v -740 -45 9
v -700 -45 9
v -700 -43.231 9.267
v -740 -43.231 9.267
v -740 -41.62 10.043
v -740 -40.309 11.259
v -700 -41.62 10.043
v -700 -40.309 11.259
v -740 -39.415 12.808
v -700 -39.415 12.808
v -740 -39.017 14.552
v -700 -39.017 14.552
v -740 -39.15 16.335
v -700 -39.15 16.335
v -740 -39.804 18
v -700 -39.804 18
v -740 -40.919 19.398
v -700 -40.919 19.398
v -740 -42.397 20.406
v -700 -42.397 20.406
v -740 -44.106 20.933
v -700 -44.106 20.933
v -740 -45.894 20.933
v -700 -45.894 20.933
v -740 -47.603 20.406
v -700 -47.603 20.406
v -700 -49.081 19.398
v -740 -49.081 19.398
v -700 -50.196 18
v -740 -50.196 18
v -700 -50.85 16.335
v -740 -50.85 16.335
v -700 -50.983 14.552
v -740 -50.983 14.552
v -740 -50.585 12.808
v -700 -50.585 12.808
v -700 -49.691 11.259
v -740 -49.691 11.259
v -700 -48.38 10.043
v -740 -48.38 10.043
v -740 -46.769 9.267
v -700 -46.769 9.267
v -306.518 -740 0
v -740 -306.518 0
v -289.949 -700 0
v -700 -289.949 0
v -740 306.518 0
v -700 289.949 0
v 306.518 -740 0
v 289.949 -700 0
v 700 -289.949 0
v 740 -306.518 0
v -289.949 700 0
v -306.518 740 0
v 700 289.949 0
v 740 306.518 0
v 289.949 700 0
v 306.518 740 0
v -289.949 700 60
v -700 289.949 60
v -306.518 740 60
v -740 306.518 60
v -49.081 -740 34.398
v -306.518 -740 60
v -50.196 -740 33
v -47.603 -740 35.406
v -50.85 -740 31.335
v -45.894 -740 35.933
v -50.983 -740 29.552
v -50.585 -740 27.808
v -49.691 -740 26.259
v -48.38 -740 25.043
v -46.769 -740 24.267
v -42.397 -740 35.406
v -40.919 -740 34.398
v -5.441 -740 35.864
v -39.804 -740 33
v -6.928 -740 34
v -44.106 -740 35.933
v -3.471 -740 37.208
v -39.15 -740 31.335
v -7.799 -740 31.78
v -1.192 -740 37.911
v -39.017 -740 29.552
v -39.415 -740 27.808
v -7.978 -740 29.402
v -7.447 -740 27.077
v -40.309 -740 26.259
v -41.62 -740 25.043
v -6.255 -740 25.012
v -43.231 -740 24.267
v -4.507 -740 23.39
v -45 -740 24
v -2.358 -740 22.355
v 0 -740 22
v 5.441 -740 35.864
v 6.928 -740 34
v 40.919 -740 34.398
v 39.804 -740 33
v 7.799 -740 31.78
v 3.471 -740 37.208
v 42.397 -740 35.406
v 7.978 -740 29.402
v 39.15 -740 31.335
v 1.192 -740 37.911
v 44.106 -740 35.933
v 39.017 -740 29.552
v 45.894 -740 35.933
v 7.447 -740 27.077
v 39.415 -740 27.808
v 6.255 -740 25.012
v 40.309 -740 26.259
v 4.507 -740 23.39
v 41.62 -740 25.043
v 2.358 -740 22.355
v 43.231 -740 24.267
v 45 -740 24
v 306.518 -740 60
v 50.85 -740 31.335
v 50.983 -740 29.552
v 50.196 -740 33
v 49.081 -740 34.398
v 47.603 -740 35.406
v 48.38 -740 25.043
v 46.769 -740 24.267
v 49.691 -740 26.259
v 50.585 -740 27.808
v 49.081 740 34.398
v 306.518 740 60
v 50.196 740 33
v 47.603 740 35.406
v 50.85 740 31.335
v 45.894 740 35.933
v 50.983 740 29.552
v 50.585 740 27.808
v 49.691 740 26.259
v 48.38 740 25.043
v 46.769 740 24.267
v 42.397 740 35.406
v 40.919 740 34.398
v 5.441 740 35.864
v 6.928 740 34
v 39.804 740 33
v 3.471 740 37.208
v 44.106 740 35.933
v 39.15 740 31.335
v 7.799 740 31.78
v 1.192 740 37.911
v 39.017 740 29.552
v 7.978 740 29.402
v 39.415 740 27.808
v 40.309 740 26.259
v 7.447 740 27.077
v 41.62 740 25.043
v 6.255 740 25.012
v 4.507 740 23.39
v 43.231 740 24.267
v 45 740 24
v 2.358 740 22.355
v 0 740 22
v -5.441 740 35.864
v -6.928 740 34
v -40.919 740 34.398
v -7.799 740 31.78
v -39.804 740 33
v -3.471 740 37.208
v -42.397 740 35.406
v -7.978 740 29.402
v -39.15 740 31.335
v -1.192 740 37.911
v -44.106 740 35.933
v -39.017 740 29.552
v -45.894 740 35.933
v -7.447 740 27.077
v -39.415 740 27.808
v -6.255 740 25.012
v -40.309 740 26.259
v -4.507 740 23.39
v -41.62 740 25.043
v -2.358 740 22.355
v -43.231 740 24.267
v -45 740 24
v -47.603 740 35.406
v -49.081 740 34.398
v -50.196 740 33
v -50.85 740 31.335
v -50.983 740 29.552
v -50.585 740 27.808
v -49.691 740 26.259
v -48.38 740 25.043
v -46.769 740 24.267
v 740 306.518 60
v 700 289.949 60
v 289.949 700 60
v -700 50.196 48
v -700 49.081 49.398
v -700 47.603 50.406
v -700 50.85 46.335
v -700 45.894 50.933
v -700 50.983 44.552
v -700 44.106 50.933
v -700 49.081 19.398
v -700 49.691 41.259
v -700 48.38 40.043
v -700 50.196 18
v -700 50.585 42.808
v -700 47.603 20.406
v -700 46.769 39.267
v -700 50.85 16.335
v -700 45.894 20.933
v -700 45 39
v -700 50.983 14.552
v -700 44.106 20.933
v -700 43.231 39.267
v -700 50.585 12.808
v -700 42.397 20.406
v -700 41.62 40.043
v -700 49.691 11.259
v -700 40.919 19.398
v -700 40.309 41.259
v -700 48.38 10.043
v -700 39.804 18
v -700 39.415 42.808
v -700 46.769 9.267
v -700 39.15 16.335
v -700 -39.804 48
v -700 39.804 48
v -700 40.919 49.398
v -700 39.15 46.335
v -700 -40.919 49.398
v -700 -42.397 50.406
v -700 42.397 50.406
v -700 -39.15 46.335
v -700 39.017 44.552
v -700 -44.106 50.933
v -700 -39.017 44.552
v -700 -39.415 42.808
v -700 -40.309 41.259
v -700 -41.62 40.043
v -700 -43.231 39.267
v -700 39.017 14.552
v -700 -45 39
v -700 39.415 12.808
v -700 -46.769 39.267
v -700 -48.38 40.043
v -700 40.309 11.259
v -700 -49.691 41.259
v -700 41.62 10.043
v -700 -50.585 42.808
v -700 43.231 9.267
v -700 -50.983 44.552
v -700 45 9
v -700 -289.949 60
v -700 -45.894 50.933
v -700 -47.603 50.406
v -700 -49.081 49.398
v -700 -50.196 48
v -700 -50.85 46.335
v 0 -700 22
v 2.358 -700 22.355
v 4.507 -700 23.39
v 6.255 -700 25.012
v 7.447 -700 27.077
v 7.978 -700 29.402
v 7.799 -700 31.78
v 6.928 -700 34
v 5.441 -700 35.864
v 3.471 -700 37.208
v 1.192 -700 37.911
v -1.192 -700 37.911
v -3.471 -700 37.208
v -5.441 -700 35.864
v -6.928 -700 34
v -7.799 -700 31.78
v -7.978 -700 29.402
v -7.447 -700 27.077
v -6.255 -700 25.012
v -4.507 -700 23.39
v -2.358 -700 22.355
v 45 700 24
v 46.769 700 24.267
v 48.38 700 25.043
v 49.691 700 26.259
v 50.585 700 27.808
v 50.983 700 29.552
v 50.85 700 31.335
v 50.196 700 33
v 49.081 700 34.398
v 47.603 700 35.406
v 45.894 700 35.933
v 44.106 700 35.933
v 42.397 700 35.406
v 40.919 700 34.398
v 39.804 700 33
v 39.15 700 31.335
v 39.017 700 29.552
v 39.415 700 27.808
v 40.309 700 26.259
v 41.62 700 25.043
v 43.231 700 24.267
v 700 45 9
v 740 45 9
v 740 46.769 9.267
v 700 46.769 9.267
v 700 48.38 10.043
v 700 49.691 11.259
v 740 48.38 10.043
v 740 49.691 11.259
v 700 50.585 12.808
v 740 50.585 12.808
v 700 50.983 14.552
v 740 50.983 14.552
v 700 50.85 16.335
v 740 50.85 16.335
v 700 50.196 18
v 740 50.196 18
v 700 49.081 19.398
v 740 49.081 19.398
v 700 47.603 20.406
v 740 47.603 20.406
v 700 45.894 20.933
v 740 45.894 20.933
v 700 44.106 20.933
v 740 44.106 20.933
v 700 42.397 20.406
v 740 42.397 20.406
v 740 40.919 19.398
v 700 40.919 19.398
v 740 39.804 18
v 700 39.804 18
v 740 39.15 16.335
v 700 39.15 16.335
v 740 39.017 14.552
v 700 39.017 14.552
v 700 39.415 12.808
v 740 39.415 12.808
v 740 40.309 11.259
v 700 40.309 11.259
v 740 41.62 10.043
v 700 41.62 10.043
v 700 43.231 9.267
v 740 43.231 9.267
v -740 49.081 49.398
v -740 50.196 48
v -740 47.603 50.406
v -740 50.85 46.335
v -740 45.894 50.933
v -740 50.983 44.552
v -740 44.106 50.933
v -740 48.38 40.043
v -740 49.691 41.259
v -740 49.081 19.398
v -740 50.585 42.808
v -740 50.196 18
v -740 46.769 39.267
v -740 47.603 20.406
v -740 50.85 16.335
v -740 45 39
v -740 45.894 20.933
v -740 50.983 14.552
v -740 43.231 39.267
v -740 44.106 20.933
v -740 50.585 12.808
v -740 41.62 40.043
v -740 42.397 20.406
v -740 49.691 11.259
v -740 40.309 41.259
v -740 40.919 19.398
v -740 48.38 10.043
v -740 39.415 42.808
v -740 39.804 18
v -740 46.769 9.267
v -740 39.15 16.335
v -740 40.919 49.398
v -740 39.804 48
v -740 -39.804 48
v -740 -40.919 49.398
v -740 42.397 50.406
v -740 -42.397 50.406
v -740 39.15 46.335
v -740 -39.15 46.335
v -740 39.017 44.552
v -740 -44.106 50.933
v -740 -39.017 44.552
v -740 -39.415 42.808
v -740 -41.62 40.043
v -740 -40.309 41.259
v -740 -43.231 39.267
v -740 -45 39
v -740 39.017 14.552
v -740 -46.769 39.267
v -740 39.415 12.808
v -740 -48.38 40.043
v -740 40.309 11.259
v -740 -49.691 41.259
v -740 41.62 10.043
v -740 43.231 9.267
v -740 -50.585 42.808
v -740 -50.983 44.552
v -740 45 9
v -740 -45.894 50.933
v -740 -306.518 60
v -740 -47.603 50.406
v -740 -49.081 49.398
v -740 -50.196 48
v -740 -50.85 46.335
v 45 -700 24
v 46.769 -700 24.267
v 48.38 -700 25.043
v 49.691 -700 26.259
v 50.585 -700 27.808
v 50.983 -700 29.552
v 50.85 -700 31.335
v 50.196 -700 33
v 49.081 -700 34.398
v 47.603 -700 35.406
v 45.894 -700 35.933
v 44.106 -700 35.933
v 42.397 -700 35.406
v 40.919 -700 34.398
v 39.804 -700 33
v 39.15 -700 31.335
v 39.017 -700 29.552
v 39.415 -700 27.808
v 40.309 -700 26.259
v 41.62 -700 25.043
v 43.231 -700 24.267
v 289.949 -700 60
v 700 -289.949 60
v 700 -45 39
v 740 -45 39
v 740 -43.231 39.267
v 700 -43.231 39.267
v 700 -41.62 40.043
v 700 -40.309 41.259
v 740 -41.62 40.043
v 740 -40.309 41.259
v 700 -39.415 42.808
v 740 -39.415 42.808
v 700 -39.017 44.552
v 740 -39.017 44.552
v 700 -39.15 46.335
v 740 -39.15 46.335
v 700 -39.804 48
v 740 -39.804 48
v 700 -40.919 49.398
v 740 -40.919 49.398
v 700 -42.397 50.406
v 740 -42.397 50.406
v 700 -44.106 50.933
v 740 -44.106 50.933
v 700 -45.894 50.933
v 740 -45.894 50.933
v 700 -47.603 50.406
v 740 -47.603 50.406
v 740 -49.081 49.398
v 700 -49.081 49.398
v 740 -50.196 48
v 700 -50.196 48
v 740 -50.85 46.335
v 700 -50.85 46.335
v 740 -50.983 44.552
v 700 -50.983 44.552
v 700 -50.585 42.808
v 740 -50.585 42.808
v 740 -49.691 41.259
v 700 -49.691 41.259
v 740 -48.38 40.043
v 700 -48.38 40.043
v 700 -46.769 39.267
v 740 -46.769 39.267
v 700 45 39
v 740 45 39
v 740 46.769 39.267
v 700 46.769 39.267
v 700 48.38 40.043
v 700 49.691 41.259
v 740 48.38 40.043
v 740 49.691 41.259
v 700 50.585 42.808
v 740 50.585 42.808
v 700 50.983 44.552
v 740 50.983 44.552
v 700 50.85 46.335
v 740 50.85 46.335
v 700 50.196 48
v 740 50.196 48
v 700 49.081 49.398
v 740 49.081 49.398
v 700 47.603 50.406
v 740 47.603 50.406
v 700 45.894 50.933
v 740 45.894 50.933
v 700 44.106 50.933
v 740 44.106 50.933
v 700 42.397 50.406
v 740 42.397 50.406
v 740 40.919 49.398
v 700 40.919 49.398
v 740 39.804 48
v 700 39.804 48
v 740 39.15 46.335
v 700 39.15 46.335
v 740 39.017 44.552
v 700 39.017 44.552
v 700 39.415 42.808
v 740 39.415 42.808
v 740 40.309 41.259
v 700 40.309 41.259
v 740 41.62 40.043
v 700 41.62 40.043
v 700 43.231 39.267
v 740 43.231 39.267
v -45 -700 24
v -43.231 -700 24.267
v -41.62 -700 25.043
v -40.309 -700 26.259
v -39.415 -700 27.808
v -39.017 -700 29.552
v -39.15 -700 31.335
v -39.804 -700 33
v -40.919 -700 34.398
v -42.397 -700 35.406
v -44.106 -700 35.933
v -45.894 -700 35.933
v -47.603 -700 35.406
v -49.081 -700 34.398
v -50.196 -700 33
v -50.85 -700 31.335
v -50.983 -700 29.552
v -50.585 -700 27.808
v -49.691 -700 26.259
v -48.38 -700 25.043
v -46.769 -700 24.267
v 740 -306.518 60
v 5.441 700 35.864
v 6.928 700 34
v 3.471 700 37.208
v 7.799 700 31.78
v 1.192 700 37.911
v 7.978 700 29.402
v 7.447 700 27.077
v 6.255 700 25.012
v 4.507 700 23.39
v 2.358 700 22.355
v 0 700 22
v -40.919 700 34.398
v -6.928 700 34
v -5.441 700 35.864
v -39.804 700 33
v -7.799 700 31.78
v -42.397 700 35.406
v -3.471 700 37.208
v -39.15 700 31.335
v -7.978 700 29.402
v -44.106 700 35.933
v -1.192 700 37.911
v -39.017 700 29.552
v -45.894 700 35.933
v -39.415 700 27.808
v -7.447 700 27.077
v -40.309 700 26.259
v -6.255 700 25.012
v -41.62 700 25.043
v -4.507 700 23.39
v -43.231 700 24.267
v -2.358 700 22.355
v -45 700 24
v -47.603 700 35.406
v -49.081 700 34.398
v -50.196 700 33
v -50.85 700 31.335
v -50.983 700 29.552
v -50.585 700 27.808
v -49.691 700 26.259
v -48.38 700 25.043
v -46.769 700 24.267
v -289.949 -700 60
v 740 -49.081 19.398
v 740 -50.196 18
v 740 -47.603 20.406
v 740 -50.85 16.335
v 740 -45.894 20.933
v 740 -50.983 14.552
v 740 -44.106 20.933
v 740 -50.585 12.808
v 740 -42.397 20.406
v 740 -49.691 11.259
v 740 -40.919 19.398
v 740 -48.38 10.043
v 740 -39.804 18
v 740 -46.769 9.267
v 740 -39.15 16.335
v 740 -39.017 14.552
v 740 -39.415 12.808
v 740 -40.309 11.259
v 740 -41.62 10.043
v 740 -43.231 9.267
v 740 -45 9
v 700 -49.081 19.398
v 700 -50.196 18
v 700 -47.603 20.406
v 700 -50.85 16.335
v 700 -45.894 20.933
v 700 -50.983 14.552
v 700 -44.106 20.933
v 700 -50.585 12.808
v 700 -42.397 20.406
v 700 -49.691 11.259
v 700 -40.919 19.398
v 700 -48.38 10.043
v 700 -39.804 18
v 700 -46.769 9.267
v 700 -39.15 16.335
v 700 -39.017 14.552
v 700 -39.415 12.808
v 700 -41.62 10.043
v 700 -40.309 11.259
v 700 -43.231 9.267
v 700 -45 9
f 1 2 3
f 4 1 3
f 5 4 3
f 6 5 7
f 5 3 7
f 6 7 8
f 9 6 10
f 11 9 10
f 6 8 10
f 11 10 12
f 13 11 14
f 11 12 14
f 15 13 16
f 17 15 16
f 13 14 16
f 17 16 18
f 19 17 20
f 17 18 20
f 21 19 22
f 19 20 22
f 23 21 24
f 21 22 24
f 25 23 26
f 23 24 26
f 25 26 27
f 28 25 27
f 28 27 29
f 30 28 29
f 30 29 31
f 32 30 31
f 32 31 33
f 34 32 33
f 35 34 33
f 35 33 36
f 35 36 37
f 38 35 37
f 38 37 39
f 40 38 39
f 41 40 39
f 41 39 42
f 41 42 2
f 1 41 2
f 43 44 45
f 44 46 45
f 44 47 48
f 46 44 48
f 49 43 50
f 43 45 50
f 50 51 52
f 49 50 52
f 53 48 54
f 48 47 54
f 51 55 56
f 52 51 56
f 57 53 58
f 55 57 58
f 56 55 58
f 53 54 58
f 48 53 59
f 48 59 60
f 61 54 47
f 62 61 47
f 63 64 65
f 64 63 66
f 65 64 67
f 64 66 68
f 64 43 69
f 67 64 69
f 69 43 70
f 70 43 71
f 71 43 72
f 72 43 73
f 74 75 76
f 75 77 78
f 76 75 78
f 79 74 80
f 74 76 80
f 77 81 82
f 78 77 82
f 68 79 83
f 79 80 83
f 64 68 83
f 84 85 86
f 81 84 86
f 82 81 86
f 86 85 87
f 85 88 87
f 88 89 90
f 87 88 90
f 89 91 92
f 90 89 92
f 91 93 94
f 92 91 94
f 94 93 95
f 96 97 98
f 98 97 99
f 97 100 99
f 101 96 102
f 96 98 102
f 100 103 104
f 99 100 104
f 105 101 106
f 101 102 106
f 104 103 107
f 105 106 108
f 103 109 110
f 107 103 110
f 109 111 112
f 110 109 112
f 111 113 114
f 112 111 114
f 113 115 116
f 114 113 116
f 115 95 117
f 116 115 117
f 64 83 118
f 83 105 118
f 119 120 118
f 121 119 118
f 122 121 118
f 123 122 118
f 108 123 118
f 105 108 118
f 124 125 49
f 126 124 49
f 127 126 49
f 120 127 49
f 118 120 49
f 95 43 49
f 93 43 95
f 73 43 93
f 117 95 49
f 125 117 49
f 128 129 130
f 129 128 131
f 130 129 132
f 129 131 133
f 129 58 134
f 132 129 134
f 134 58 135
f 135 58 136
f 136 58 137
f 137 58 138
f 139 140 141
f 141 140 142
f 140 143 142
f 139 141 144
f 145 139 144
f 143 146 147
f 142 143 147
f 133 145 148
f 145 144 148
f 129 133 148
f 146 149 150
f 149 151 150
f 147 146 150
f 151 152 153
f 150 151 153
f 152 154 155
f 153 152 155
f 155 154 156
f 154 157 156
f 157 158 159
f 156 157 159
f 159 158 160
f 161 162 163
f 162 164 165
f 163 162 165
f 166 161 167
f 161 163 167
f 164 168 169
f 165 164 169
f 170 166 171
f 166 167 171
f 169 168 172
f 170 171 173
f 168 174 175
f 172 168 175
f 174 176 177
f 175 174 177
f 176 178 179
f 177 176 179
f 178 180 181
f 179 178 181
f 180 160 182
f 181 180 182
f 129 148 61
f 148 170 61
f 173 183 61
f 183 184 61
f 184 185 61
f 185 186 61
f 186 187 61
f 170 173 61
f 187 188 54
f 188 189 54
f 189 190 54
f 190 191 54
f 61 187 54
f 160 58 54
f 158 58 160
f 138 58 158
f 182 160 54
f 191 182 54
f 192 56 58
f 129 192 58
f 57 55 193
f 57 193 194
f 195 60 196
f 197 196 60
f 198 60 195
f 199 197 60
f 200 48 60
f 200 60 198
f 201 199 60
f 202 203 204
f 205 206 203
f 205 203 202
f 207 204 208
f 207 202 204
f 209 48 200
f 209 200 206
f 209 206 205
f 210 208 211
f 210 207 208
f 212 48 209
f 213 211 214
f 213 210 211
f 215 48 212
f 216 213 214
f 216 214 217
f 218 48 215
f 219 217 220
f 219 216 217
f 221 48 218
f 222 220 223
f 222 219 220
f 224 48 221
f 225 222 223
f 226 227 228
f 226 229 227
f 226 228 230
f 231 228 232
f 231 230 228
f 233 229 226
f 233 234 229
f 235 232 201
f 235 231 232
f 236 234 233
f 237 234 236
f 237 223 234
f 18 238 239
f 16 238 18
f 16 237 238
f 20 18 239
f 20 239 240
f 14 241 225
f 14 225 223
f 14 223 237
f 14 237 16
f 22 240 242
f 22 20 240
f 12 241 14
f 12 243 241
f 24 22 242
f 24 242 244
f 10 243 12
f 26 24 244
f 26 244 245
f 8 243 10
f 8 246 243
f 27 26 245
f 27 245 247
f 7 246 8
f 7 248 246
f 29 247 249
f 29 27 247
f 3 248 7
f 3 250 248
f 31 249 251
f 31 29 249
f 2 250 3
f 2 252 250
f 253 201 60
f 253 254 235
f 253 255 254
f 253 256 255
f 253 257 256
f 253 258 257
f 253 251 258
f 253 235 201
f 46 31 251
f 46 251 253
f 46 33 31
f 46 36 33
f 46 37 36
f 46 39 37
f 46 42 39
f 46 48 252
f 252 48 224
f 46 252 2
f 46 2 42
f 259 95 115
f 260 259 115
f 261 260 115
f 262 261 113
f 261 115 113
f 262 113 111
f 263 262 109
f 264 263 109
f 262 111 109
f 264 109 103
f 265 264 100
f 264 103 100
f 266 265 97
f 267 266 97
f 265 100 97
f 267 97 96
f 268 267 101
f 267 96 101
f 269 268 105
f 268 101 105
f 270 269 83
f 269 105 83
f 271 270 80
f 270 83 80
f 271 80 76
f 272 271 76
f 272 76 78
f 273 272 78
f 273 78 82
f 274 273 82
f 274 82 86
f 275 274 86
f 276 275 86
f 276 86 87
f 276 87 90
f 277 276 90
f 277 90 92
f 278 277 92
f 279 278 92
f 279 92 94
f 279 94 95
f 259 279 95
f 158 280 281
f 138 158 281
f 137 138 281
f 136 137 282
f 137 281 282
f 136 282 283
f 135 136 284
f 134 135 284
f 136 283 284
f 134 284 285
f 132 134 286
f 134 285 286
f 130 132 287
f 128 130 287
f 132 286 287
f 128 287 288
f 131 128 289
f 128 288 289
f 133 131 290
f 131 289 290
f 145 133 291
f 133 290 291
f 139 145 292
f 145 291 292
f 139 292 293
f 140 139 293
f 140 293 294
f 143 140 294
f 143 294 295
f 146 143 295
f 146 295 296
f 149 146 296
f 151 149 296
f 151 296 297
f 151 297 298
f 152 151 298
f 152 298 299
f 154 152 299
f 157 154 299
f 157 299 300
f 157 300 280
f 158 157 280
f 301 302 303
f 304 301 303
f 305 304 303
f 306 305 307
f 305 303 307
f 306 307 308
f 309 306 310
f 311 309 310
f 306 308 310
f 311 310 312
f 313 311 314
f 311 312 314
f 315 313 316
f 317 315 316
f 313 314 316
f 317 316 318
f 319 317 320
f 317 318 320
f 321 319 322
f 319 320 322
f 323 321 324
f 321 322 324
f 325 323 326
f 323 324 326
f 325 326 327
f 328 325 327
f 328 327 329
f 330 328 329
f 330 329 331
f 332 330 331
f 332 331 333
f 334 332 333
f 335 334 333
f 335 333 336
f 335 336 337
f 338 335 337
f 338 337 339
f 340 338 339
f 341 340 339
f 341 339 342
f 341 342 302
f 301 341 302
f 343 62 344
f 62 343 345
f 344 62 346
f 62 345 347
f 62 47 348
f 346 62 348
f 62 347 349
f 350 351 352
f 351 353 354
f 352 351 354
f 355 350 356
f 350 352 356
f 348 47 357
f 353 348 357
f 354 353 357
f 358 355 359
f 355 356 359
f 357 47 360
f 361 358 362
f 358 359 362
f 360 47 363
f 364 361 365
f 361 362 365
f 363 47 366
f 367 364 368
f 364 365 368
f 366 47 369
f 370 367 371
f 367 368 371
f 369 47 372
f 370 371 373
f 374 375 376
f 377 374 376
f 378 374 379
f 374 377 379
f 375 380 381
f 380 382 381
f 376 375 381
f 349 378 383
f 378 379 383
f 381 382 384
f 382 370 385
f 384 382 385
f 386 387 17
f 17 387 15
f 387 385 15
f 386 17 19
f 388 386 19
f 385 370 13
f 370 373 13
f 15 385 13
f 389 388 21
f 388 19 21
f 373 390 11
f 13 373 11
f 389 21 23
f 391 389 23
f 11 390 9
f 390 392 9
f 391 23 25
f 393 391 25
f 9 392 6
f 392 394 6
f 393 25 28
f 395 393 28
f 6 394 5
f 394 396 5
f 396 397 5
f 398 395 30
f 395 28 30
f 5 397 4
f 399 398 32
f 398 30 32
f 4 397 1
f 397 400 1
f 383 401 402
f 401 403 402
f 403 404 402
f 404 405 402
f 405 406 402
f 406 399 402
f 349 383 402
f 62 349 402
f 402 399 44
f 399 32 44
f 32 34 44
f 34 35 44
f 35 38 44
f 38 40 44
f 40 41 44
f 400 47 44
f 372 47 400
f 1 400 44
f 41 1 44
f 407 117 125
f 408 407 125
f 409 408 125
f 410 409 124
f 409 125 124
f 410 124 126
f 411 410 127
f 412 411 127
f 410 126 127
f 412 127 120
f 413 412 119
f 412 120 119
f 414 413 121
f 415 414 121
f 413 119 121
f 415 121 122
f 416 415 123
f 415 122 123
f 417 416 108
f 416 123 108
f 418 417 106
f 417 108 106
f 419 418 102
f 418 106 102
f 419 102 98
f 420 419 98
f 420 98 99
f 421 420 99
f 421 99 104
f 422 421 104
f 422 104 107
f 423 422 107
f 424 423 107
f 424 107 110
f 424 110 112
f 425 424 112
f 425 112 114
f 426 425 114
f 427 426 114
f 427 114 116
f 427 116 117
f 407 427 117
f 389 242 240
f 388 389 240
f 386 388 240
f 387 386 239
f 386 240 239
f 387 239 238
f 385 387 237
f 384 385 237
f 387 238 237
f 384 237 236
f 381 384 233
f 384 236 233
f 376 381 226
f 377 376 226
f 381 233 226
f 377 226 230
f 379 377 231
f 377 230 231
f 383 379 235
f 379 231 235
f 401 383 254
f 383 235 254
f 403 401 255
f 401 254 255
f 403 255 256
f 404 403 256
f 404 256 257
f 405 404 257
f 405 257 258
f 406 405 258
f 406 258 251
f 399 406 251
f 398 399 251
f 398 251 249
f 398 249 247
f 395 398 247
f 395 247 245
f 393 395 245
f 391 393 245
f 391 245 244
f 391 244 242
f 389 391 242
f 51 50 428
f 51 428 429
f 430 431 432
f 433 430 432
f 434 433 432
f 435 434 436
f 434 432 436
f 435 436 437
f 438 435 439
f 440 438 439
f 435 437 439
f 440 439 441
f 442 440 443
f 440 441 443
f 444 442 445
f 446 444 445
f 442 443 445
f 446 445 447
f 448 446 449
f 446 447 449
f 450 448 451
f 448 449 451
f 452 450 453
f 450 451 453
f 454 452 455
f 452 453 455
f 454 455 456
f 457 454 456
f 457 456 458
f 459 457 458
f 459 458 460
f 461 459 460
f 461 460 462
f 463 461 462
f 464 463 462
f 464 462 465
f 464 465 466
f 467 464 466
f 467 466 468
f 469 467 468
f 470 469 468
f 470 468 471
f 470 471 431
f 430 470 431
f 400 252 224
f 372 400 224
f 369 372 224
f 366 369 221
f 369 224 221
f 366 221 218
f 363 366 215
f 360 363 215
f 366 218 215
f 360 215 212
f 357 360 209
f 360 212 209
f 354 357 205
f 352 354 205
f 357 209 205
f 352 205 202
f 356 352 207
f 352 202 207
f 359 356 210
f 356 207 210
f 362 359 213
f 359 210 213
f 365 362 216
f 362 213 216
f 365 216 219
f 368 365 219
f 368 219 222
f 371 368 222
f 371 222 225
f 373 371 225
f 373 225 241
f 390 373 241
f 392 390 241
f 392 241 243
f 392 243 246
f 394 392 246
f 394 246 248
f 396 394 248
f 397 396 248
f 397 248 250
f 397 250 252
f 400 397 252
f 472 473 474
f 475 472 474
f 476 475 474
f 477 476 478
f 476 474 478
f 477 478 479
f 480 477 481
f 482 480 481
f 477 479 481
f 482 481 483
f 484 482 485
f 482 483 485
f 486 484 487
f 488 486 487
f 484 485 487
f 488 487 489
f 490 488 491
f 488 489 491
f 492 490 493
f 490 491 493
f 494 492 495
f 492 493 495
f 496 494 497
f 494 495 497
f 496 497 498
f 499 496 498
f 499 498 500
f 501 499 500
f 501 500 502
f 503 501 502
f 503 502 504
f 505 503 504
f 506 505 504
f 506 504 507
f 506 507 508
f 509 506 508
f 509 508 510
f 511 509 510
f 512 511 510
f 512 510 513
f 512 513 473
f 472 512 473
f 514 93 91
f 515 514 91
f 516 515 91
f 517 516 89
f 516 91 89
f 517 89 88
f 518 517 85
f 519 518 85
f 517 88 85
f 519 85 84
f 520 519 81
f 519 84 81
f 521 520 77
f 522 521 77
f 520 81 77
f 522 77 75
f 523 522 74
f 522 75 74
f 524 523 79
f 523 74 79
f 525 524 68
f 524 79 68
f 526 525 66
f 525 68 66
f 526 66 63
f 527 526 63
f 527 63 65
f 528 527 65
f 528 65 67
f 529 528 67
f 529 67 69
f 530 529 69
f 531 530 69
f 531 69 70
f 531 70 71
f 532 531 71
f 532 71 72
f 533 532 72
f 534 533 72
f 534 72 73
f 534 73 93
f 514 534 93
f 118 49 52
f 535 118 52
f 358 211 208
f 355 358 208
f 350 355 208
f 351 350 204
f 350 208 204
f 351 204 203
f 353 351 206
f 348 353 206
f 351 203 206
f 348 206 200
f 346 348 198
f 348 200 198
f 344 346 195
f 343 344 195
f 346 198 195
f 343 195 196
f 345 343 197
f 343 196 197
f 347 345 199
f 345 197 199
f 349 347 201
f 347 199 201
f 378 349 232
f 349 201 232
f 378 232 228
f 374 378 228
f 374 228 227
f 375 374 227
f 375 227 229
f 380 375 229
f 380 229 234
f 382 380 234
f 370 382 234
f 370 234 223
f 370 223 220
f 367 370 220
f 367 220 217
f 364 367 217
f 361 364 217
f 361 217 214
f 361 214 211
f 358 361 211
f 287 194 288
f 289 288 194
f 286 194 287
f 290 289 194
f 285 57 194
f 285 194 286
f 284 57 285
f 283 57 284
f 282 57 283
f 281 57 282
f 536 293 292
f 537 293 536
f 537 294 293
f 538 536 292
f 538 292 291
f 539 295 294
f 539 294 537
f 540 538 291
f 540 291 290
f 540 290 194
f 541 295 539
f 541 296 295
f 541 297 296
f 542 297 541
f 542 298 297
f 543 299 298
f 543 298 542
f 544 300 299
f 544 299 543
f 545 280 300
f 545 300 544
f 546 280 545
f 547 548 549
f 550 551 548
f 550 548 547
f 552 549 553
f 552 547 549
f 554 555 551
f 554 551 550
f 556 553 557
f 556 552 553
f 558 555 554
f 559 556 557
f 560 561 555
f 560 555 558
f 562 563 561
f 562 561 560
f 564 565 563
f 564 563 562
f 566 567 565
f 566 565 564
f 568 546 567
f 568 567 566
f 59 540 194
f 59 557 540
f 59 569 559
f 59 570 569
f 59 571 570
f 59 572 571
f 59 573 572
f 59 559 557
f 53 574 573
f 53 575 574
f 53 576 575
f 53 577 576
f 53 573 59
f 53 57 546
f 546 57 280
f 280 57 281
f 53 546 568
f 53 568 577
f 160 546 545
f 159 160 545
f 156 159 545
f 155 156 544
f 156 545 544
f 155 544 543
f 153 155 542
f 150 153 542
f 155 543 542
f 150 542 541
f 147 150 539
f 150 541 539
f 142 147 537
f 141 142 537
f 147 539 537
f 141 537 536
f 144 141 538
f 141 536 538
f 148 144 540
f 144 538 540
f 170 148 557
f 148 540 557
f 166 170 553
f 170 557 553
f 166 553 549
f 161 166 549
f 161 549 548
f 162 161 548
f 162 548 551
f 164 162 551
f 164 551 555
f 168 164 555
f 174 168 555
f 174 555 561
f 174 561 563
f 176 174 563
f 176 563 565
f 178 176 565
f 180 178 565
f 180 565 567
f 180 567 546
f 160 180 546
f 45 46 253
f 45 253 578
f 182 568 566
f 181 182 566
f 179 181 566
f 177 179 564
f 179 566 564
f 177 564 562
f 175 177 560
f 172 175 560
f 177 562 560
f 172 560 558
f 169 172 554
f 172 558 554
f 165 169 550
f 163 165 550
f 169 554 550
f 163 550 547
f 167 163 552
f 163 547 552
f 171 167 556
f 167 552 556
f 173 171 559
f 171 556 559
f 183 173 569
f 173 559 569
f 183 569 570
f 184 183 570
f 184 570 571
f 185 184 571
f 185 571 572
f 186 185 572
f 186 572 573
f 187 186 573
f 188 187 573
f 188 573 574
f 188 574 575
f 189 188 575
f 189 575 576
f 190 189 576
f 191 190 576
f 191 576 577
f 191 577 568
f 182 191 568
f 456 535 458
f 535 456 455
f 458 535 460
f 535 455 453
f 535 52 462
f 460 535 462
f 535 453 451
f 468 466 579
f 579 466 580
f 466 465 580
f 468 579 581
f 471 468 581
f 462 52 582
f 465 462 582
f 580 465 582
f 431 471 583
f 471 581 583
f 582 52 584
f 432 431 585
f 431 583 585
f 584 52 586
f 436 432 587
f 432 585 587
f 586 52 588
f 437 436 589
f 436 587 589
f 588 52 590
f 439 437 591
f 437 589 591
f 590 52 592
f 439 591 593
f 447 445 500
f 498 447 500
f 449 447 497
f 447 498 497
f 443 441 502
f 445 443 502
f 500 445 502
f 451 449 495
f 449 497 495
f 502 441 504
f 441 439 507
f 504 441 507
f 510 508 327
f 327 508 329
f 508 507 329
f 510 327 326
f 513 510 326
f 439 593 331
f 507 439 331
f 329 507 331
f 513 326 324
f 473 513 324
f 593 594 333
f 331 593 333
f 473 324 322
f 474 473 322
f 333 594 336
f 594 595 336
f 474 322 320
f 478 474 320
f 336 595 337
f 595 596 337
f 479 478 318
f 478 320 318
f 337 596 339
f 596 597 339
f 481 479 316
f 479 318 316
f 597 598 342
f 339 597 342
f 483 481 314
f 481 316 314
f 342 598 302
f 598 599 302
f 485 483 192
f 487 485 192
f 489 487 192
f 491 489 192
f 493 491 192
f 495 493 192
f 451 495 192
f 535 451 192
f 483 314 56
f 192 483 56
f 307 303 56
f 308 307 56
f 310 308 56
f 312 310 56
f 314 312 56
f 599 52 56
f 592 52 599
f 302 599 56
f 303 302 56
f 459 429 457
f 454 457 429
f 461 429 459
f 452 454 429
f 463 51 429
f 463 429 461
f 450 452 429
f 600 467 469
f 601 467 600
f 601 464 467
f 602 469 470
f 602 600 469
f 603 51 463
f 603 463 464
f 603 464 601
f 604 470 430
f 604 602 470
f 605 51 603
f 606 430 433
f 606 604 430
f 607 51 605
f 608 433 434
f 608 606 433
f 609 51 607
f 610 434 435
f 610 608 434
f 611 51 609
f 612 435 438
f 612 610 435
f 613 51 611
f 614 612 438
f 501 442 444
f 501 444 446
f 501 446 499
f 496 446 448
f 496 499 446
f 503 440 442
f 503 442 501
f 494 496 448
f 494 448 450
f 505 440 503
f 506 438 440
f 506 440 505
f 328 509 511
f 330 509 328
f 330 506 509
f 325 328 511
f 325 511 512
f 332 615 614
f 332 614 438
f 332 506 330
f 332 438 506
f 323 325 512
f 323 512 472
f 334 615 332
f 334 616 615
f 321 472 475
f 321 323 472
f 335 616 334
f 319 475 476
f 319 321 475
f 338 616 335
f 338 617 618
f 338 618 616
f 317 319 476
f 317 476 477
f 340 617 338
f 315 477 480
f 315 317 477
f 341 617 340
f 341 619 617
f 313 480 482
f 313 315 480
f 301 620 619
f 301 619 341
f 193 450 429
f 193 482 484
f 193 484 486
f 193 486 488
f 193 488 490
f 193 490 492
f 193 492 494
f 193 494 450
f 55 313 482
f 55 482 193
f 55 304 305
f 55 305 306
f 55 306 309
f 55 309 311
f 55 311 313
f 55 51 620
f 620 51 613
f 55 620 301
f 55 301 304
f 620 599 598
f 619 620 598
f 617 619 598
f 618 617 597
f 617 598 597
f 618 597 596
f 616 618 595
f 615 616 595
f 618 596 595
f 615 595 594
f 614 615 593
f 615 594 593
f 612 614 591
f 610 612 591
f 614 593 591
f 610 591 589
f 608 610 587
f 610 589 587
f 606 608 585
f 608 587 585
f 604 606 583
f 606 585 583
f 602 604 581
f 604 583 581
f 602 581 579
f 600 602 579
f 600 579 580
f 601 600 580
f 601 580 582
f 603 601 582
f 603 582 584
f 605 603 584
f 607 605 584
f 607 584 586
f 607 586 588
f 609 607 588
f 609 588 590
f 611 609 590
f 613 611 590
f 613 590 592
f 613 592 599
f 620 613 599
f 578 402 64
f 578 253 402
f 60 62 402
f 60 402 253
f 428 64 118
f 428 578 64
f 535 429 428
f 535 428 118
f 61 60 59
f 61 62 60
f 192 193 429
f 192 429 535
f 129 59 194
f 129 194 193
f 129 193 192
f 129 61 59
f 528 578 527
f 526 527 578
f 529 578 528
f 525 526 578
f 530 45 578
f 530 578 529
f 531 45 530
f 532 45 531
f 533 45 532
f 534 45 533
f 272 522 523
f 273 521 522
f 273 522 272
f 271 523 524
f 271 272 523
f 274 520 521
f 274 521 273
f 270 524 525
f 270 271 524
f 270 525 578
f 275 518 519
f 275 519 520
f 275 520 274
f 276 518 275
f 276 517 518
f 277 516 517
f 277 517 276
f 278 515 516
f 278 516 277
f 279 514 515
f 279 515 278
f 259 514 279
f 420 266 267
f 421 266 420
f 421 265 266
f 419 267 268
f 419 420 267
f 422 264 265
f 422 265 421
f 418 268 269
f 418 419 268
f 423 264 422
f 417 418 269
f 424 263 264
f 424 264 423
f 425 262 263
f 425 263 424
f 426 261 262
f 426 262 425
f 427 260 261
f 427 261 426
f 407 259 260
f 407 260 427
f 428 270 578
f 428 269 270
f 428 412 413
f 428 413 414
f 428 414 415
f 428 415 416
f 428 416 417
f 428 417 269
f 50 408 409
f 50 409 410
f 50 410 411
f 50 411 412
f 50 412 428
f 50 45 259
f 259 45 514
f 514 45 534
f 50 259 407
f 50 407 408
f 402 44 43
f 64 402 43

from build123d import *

# Parameters (mm, degrees)
BOSS_EXTRUDE1_DEPTH = 60
SKETCH4_R           = 8
SKETCH4_R_2         = 6
CUT_EXTRUDE1_DEPTH  = 1968
SKETCH6_R           = 6
CUT_EXTRUDE2_DEPTH  = 1968


with BuildPart() as part:
    # Sketch2 → Boss-Extrude1 (new body)
    with BuildSketch(Plane.XY):
        Polygon((740, 306.518036156), (306.518036156, 740), (-306.518036156, 740), (-740, 306.518036156), (-740, -306.518036156), (-306.518036156, -740), (306.518036156, -740), (740, -306.518036156), align=None)
        Polygon((700, -289.949493661), (700, 289.949493661), (289.949493661, 700), (-289.949493661, 700), (-700, 289.949493661), (-700, -289.949493661), (-289.949493661, -700), (289.949493661, -700), align=None, mode=Mode.SUBTRACT)
    extrude(amount=BOSS_EXTRUDE1_DEPTH)

    # Sketch4 → Cut-Extrude1 (cut)
    with BuildSketch(Plane.XZ.offset(740)):
        with Locations(Location((0, 30, 0), (0, 0, 270))):
            Circle(SKETCH4_R)
        with Locations(Location((-45, 30, 0), (0, 0, 270))):
            Circle(SKETCH4_R_2)
        with Locations(Location((45, 30, 0), (0, 0, 270))):
            Circle(SKETCH4_R_2)
    extrude(amount=-CUT_EXTRUDE1_DEPTH, mode=Mode.SUBTRACT)

    # Sketch6 → Cut-Extrude2 (cut)
    with BuildSketch(Plane(origin=(740, 0, 0), x_dir=(0, 0, -1), z_dir=(1, 0, 0))):
        with Locations((-15, 45)):
            Circle(SKETCH6_R)
        with Locations((-15, -45)):
            Circle(SKETCH6_R)
        with Locations((-45, 45)):
            Circle(SKETCH6_R)
        with Locations((-45, -45)):
            Circle(SKETCH6_R)
    extrude(amount=-CUT_EXTRUDE2_DEPTH, mode=Mode.SUBTRACT)


solid = part.part
